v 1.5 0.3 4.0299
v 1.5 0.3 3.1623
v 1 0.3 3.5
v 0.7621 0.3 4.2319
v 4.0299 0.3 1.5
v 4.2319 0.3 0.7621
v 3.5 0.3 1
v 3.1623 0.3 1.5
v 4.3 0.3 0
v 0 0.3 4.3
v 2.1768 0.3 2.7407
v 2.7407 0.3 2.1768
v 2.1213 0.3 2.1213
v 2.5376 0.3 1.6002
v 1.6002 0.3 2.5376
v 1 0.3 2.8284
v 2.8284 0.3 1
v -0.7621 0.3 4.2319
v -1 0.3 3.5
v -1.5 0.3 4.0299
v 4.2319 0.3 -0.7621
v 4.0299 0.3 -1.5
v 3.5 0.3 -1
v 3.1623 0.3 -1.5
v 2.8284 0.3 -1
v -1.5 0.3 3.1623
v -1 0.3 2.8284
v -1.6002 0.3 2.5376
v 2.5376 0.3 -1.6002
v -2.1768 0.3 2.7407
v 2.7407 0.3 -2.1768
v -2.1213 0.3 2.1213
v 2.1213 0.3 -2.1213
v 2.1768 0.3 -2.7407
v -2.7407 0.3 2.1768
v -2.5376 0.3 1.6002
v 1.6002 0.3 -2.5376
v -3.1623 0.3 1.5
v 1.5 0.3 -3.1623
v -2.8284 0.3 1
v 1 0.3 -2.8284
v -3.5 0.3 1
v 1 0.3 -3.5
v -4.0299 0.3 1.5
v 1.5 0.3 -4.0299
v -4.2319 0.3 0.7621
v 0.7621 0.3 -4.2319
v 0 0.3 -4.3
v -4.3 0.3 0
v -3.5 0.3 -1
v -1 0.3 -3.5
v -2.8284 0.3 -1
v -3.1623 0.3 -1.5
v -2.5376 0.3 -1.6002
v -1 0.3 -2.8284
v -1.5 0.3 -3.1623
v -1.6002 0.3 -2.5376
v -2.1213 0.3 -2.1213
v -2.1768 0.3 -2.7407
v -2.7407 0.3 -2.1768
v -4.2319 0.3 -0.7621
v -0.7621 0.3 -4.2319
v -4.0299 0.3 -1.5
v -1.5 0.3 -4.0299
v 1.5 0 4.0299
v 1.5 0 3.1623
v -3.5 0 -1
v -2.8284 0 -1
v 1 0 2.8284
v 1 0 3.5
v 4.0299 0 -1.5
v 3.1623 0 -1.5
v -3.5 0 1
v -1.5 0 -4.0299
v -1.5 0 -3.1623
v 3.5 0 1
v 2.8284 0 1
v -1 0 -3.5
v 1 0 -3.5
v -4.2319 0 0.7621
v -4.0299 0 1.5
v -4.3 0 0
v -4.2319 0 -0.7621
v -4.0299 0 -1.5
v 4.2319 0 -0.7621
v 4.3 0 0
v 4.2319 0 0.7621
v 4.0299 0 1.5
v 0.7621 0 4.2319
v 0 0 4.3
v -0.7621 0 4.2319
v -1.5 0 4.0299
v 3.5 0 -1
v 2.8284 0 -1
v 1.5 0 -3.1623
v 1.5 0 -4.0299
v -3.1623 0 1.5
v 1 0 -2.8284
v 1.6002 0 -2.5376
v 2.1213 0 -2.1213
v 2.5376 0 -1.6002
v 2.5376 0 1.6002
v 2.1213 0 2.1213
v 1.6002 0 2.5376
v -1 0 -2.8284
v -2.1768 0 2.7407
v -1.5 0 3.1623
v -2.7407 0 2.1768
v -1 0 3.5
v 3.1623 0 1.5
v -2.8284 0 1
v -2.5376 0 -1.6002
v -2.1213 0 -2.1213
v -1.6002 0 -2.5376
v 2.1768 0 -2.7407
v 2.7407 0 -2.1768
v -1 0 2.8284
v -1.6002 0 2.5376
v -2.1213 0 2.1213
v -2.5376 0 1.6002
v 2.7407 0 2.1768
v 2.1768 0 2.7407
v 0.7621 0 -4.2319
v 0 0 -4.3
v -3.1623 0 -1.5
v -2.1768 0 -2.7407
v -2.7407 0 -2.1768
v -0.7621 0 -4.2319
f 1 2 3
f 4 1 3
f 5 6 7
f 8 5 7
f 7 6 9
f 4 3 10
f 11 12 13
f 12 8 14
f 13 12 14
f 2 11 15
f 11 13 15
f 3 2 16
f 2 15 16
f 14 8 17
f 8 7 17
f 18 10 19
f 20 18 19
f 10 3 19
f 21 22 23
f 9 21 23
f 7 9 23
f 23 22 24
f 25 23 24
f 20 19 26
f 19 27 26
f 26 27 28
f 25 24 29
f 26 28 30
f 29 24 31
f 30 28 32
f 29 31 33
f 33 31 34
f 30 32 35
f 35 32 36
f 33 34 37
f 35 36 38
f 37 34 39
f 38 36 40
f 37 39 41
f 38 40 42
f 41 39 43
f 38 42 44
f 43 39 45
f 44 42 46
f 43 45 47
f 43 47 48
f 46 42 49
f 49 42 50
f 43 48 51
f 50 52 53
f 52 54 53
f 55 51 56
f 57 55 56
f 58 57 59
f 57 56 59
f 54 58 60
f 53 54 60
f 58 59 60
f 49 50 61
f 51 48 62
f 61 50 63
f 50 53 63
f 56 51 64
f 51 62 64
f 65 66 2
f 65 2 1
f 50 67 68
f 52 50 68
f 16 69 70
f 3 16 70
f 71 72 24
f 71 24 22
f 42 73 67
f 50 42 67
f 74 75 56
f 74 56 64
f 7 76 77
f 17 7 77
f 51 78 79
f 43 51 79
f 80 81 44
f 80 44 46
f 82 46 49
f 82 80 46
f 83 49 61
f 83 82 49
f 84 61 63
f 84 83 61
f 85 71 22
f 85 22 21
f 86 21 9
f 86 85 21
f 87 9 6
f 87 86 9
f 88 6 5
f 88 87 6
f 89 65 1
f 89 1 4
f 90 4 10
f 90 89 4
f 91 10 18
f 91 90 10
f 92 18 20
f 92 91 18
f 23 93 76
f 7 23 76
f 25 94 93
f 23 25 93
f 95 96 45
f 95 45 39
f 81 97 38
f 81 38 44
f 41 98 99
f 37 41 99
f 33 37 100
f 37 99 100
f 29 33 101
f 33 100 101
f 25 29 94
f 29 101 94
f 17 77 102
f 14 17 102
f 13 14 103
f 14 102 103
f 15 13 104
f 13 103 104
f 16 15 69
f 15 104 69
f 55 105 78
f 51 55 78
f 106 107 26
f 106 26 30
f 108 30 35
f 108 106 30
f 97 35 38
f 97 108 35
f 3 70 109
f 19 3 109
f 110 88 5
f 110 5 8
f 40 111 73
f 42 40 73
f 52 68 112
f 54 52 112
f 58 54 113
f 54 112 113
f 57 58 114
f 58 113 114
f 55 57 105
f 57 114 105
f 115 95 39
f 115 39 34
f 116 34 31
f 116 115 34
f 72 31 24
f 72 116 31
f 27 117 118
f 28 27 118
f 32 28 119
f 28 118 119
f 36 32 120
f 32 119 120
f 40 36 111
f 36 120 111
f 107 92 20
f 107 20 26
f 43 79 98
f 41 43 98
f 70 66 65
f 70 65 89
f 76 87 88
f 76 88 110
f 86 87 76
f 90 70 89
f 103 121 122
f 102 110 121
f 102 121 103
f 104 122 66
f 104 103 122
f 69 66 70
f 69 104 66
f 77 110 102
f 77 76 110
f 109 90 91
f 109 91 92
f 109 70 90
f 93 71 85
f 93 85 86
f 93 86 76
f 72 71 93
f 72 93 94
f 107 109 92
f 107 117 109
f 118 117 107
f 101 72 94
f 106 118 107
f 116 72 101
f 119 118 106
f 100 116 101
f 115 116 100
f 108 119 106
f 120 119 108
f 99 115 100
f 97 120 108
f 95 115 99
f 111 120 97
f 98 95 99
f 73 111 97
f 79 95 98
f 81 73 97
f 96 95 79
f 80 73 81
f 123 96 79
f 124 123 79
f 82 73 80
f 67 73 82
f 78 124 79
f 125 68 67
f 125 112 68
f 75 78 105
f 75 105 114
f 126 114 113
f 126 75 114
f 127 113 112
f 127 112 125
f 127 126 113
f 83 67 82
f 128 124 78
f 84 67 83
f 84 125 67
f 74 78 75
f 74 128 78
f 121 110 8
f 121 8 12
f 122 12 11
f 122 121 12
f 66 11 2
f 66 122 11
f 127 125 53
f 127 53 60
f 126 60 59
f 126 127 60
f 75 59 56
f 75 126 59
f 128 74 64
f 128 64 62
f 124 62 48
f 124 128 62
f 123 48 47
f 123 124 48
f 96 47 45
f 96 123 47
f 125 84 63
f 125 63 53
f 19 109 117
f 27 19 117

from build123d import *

# Parameters (mm, degrees)
BOSS_EXTRUDE1_DEPTH = 0.3


with BuildPart() as part:
    # Sketch1 → Boss-Extrude1 (new body)
    with BuildSketch(Plane(origin=(0, 0, 0), x_dir=(1, 0, 0), z_dir=(0, 1, 0))):
        with BuildLine():
            Line((-4.029888336, 1.5), (-3.16227766, 1.5))
            ThreePointArc((-3.16227766, 1.5), (-2.474873734, 2.474873734), (-1.5, 3.16227766))
            Line((-1.5, 3.16227766), (-1.5, 4.029888336))
            ThreePointArc((-1.5, 4.029888336), (0, 4.3), (1.5, 4.029888336))
            Line((1.5, 4.029888336), (1.5, 3.16227766))
            ThreePointArc((1.5, 3.16227766), (2.474873734, 2.474873734), (3.16227766, 1.5))
            Line((3.16227766, 1.5), (4.029888336, 1.5))
            ThreePointArc((4.029888336, 1.5), (4.3, 0), (4.029888336, -1.5))
            Line((4.029888336, -1.5), (3.16227766, -1.5))
            ThreePointArc((3.16227766, -1.5), (2.474873734, -2.474873734), (1.5, -3.16227766))
            Line((1.5, -3.16227766), (1.5, -4.029888336))
            ThreePointArc((1.5, -4.029888336), (0, -4.3), (-1.5, -4.029888336))
            Line((-1.5, -4.029888336), (-1.5, -3.16227766))
            ThreePointArc((-1.5, -3.16227766), (-2.474873734, -2.474873734), (-3.16227766, -1.5))
            Line((-3.16227766, -1.5), (-4.029888336, -1.5))
            ThreePointArc((-4.029888336, -1.5), (-4.3, 0), (-4.029888336, 1.5))
        make_face()
        with BuildLine():
            Line((-3.5, 1), (-2.828427125, 1))
            ThreePointArc((-2.828427125, 1), (-2.121320344, 2.121320344), (-1, 2.828427125))
            Line((-1, 2.828427125), (-1, 3.5))
            Line((-1, 3.5), (1, 3.5))
            Line((1, 3.5), (1, 2.828427125))
            ThreePointArc((1, 2.828427125), (2.121320344, 2.121320344), (2.828427125, 1))
            Line((2.828427125, 1), (3.5, 1))
            Line((3.5, 1), (3.5, -1))
            Line((3.5, -1), (2.828427125, -1))
            ThreePointArc((2.828427125, -1), (2.121320344, -2.121320344), (1, -2.828427125))
            Line((1, -2.828427125), (1, -3.5))
            Line((1, -3.5), (-1, -3.5))
            Line((-1, -3.5), (-1, -2.828427125))
            ThreePointArc((-1, -2.828427125), (-2.121320344, -2.121320344), (-2.828427125, -1))
            Line((-2.828427125, -1), (-3.5, -1))
            Line((-3.5, -1), (-3.5, 1))
        make_face(mode=Mode.SUBTRACT)
    extrude(amount=BOSS_EXTRUDE1_DEPTH)


solid = part.part
